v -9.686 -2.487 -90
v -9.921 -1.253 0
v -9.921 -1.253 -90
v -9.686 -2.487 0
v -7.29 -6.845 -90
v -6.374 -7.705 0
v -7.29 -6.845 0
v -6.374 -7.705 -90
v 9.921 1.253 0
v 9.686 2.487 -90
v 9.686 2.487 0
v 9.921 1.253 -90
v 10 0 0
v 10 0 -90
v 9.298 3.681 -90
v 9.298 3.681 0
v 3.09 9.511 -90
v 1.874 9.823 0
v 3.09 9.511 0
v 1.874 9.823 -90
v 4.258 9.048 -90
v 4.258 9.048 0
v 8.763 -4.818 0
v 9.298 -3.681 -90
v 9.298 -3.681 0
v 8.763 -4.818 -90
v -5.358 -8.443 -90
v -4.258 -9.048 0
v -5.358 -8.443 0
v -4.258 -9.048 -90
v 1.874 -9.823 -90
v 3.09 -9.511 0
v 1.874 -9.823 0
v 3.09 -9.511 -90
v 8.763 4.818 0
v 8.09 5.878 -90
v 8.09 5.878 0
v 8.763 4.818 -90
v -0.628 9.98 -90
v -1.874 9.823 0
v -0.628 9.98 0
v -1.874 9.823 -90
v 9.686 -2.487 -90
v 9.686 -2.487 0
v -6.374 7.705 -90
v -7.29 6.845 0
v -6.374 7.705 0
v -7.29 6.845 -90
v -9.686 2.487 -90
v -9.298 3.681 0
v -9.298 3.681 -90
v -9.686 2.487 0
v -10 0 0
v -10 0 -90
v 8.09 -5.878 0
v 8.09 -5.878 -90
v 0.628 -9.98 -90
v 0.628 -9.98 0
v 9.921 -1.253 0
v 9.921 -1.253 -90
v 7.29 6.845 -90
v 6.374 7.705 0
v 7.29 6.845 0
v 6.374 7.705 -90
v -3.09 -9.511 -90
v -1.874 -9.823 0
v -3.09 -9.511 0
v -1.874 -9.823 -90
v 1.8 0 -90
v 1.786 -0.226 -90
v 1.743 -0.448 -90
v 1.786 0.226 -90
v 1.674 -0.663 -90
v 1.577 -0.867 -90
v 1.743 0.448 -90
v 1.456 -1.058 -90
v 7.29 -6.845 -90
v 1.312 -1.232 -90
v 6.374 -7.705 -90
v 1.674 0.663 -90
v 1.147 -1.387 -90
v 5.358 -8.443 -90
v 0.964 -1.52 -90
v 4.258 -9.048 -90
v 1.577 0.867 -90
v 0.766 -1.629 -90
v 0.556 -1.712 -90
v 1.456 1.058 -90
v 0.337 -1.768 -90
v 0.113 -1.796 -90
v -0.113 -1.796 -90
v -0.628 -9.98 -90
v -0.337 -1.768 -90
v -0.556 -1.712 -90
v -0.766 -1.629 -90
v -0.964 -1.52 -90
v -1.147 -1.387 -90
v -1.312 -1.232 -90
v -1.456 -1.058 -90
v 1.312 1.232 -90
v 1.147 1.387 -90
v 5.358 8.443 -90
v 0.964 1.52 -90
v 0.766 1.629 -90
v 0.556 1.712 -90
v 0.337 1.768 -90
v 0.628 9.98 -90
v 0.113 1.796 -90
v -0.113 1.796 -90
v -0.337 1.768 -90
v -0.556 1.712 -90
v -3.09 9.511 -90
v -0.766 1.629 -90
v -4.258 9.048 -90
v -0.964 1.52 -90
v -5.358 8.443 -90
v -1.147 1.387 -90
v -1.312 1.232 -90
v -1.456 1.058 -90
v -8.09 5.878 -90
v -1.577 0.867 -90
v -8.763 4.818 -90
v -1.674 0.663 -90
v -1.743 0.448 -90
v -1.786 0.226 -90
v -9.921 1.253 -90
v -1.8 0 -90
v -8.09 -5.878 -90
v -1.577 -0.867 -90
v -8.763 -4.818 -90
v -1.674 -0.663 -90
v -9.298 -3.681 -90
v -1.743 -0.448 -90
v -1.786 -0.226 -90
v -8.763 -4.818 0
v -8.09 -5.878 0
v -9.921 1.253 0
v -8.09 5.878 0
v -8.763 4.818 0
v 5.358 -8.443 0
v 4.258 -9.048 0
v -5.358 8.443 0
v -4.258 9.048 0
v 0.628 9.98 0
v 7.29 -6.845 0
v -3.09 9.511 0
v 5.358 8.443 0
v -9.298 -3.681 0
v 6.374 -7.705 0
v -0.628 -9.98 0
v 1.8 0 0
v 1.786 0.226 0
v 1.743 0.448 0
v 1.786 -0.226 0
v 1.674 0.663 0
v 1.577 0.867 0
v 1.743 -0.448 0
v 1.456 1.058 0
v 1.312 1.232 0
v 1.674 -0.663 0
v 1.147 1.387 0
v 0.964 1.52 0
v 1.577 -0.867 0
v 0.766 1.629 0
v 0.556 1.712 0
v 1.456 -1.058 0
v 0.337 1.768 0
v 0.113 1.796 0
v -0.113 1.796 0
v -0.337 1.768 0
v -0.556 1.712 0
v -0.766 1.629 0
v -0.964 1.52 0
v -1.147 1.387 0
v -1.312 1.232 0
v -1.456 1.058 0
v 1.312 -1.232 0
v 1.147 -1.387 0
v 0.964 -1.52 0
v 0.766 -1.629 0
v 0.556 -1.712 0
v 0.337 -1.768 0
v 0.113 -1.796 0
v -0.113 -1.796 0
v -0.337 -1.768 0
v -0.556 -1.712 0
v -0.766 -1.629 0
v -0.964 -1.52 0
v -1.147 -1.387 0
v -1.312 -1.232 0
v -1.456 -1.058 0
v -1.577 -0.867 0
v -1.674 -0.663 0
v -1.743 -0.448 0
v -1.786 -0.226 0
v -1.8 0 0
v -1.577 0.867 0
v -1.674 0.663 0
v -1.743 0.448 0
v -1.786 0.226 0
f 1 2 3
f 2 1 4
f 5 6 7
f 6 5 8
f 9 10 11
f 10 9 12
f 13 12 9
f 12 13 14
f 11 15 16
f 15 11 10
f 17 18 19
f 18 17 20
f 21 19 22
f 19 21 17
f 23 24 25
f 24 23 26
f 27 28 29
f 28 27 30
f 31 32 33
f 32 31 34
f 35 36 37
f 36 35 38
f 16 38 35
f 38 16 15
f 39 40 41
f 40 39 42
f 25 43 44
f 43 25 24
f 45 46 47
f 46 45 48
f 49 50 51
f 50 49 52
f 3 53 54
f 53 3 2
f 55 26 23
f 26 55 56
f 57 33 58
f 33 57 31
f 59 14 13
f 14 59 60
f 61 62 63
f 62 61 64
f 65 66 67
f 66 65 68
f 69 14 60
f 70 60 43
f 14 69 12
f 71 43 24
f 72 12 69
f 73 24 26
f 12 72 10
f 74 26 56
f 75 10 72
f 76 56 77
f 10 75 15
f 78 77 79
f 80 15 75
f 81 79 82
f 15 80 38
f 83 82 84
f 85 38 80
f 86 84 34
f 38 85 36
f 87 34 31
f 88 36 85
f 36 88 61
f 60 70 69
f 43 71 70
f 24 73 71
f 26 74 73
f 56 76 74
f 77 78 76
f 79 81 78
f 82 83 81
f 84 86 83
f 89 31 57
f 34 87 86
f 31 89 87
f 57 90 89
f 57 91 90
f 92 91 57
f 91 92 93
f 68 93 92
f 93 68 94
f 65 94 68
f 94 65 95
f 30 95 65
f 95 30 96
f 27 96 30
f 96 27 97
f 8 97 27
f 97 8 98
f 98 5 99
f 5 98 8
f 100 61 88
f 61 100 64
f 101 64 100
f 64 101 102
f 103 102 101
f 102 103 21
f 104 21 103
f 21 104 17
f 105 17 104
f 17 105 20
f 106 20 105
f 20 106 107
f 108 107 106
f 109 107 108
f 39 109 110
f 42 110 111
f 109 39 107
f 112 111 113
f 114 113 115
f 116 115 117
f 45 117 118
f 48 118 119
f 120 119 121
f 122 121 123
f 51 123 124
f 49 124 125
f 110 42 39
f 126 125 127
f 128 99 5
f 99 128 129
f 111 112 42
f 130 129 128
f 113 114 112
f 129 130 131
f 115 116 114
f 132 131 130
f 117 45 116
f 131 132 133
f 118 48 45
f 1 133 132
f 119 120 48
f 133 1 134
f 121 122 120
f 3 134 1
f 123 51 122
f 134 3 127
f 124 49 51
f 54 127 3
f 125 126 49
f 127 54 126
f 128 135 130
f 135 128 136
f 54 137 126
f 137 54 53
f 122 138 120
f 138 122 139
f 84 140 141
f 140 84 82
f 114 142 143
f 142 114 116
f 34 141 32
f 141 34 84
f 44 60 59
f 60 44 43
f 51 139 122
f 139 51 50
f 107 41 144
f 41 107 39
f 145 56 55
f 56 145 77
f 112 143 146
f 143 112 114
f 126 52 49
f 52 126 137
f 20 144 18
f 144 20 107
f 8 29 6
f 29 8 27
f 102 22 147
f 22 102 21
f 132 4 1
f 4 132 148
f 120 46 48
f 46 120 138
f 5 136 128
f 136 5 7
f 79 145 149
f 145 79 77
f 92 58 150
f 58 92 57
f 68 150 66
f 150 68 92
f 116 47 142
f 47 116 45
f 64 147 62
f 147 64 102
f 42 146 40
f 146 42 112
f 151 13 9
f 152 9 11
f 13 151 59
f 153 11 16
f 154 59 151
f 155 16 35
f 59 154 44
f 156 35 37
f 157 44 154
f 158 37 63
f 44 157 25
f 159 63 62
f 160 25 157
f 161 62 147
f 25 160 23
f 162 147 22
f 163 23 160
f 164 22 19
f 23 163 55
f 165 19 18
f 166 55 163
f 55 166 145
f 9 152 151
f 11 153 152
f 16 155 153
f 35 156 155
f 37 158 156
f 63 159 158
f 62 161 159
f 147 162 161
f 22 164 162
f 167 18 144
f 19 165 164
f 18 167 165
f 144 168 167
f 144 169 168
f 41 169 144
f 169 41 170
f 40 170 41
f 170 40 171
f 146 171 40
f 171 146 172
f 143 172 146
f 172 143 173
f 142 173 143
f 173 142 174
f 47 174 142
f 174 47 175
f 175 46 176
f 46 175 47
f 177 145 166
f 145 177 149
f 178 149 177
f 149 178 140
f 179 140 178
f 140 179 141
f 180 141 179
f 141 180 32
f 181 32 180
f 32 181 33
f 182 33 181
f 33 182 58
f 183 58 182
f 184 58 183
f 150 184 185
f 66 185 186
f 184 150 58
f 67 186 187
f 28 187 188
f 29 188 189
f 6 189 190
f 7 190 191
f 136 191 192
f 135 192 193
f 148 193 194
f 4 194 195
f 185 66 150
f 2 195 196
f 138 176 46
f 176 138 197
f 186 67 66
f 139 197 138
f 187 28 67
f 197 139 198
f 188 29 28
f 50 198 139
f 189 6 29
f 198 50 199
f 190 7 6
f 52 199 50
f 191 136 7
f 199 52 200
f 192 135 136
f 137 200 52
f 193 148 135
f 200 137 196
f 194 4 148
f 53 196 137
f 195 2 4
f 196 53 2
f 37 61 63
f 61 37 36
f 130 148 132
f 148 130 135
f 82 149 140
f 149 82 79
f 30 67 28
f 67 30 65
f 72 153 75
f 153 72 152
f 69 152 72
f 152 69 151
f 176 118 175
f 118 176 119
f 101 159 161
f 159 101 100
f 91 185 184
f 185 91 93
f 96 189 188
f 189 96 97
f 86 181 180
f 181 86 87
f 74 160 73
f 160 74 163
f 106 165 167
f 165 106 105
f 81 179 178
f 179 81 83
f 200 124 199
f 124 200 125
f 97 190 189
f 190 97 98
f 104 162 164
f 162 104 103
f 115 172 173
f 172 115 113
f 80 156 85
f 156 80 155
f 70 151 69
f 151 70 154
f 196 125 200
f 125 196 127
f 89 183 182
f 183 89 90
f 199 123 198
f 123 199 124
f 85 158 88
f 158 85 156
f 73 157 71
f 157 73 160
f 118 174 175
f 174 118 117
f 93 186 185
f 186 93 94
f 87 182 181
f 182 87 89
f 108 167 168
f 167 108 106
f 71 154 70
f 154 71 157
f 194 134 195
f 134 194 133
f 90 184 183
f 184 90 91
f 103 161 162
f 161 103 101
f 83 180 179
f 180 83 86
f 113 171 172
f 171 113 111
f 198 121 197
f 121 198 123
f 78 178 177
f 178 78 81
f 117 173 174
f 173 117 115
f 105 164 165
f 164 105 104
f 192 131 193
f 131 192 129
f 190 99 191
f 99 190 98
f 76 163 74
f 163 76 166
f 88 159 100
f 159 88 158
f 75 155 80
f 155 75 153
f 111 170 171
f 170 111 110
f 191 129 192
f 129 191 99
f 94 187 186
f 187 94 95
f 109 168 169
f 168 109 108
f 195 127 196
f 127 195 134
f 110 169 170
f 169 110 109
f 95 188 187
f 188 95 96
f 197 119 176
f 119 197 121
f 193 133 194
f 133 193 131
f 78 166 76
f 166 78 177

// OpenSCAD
$fn = 50;


difference() {
	union() {
		translate(v = [0, 0, -90.0000000000]) {
			cylinder(h = 90, r = 10.0000000000);
		}
		cylinder(h = 0, r = 19.0000000000);
	}
	union() {
		#translate(v = [0, 0, -90]) {
			cylinder(h = 90, r = 1.8000000000);
		}
	}
}
